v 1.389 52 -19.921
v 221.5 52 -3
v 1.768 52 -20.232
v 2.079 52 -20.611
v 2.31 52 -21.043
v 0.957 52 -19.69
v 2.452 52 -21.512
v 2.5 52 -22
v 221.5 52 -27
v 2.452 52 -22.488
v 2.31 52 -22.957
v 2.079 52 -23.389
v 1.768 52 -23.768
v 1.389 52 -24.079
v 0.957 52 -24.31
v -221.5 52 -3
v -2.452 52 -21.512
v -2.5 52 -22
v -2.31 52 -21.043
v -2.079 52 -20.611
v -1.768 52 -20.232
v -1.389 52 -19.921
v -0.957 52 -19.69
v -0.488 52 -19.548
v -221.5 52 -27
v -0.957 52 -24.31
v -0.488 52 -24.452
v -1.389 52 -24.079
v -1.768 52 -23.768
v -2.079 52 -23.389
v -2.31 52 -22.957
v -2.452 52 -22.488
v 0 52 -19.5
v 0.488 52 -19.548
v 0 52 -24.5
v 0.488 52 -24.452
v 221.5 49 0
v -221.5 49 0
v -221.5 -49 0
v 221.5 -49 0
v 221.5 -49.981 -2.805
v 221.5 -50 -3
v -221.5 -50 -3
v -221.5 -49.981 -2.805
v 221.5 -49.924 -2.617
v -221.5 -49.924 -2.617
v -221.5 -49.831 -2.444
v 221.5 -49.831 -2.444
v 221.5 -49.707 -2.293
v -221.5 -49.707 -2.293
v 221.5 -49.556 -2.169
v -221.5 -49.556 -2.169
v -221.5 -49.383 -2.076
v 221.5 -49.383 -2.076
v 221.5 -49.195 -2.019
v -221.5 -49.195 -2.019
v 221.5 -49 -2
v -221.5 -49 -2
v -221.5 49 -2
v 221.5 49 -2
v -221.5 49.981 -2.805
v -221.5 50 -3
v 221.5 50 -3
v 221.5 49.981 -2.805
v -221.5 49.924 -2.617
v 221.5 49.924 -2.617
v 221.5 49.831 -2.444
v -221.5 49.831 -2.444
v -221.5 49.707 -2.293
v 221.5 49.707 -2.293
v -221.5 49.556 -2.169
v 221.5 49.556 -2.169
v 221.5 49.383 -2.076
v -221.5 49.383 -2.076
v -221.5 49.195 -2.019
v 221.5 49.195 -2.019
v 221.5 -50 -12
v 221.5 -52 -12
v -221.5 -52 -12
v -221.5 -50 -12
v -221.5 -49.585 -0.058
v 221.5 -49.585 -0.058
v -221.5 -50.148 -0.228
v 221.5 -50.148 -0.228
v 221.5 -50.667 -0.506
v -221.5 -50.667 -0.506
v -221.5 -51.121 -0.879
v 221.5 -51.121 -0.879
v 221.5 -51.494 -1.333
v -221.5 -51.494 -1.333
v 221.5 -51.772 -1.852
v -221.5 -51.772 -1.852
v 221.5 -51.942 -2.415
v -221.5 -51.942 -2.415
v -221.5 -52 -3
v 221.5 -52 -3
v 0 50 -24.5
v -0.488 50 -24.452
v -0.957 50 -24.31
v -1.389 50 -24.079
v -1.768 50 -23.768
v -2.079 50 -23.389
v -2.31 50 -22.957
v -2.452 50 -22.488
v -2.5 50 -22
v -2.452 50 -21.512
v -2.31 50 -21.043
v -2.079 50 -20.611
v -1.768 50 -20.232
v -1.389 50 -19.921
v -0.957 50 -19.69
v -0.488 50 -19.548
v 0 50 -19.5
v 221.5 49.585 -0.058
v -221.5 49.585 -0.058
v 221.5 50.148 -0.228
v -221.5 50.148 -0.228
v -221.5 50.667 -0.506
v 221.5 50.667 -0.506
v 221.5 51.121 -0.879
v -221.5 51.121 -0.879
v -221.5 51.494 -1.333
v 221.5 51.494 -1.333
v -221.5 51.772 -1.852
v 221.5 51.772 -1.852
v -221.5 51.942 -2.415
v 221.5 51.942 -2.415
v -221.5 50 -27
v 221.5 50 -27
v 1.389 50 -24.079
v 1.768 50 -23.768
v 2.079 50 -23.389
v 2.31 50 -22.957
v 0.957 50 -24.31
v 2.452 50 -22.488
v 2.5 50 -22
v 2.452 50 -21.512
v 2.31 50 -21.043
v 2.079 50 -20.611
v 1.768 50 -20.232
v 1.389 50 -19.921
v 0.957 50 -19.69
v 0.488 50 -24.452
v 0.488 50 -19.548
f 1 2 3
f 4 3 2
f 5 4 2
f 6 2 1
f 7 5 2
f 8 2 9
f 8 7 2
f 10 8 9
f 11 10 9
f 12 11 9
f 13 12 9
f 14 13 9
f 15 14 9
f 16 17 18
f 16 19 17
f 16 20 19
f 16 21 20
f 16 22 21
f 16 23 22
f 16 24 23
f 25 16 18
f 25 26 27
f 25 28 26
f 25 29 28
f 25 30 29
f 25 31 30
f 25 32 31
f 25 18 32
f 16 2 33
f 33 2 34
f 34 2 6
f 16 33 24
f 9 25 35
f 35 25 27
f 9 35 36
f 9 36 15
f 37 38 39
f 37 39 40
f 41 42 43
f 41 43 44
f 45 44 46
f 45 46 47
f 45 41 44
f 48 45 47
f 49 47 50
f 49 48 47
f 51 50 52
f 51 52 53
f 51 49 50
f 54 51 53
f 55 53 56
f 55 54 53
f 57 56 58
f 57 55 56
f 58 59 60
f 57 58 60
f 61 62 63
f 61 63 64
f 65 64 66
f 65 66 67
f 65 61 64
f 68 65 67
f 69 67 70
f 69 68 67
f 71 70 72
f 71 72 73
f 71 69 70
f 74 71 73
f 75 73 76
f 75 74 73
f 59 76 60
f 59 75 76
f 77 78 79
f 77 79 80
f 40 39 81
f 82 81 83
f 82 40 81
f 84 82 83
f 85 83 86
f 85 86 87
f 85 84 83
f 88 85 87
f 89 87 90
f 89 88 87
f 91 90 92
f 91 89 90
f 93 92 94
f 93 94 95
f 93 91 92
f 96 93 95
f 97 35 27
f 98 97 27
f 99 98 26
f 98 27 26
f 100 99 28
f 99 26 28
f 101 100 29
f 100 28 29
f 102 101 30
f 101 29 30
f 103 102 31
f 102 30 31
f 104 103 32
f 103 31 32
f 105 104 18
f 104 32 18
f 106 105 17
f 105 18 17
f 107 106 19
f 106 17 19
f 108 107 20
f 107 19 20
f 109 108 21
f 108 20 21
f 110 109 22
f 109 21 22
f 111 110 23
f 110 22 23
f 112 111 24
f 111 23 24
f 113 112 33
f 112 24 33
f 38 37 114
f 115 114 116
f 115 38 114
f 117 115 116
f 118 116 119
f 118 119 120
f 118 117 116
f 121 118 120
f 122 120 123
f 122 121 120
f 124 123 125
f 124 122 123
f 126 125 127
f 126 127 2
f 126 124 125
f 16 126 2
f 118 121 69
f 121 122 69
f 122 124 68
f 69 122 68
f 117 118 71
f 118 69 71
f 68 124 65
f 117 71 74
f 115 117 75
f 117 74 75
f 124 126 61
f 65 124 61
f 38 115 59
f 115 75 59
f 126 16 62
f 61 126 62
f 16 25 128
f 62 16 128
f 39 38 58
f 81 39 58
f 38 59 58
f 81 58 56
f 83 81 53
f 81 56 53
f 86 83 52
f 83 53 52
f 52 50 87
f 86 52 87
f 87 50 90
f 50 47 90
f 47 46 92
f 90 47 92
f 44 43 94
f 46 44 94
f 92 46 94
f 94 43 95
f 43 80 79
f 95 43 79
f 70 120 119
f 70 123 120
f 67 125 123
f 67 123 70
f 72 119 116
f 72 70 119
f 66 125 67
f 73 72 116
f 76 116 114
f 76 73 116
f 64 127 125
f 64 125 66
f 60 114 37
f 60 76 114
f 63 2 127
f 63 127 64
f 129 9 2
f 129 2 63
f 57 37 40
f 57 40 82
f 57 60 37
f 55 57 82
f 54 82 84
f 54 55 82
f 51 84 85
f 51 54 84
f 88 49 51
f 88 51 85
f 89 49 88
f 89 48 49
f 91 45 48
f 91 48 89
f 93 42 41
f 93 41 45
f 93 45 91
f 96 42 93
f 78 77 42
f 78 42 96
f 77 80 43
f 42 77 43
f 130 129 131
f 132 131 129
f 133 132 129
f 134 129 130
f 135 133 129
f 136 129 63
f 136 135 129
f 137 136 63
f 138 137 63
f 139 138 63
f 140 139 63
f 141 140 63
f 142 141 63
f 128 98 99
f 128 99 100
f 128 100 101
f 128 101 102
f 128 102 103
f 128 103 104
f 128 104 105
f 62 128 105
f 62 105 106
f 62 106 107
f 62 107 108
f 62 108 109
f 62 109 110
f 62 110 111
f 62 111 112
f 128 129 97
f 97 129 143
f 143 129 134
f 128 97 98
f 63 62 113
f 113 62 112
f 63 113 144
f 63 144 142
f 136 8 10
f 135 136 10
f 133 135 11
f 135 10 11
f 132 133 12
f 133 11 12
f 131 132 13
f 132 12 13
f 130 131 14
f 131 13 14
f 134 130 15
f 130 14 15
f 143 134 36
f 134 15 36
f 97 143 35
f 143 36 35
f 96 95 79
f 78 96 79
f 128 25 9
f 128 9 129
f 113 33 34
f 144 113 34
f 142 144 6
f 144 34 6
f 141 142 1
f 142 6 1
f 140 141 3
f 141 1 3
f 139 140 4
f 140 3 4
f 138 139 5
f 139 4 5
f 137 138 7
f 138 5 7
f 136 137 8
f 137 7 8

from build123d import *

# Parameters (mm, degrees)
SKETCH1_W                    = 443
SKETCH1_H                    = 100
BASE_FLANGE1_DEPTH           = 2
EDGE_FLANGE1_STRIP_W         = 10
EDGE_FLANGE1_STRIP_H         = 2
EDGE_FLANGE1_STRIP_CUT_DEPTH = 443
EDGE_FLANGE1_DEPTH           = 443
EDGE_FLANGE2_STRIP_W         = 10
EDGE_FLANGE2_STRIP_H         = 2
EDGE_FLANGE2_STRIP_CUT_DEPTH = 443
EDGE_FLANGE2_DEPTH           = 443
CUT_EXTRUDE2_DEPTH           = 10


# Sheet-metal steps are written as plain solids
with BuildPart() as part:
    # Sketch1 → Base-Flange1 (new body)
    with BuildSketch(Plane.XY):
        Rectangle(SKETCH1_W, SKETCH1_H)
    extrude(amount=-BASE_FLANGE1_DEPTH)

    # Edge-Flange1 strip (across the edge) → Edge-Flange1 strip cut (cut)
    with BuildSketch(Plane(origin=(-221.5, 50, -2), x_dir=(0, -1, 0), z_dir=(1, 0, 0))):
        with Locations((-4, -1)):
            Rectangle(EDGE_FLANGE1_STRIP_W, EDGE_FLANGE1_STRIP_H)
    extrude(amount=EDGE_FLANGE1_STRIP_CUT_DEPTH, mode=Mode.SUBTRACT)

    # Edge-Flange1 section (across the edge) → Edge-Flange1 (add)
    with BuildSketch(Plane(origin=(-221.5, 50, -2), x_dir=(0, -1, 0), z_dir=(1, 0, 0))):
        with BuildLine():
            Line((-2, 1), (-2, 25))
            Line((-2, 25), (0, 25))
            Line((0, 25), (0, 1))
            ThreePointArc((0, 1), (0.292893219, 0.292893219), (1, 0))
            Line((1, 0), (1, -2))
            ThreePointArc((1, -2), (-1.121320344, -1.121320344), (-2, 1))
        make_face()
    extrude(amount=EDGE_FLANGE1_DEPTH)

    # Edge-Flange2 strip (across the edge) → Edge-Flange2 strip cut (cut)
    with BuildSketch(Plane(origin=(221.5, -50, -2), x_dir=(0, 1, 0), z_dir=(-1, 0, 0))):
        with Locations((-4, -1)):
            Rectangle(EDGE_FLANGE2_STRIP_W, EDGE_FLANGE2_STRIP_H)
    extrude(amount=EDGE_FLANGE2_STRIP_CUT_DEPTH, mode=Mode.SUBTRACT)

    # Edge-Flange2 section (across the edge) → Edge-Flange2 (add)
    with BuildSketch(Plane(origin=(221.5, -50, -2), x_dir=(0, 1, 0), z_dir=(-1, 0, 0))):
        with BuildLine():
            Line((-2, 1), (-2, 10))
            Line((-2, 10), (0, 10))
            Line((0, 10), (0, 1))
            ThreePointArc((0, 1), (0.292893219, 0.292893219), (1, 0))
            Line((1, 0), (1, -2))
            ThreePointArc((1, -2), (-1.121320344, -1.121320344), (-2, 1))
        make_face()
    extrude(amount=EDGE_FLANGE2_DEPTH)

    # Sketch13 → Cut-Extrude2 (cut)
    with BuildSketch(Plane(origin=(0, 52, 0), x_dir=(1, 0, 0), z_dir=(0, 1, 0))):
        with BuildLine():
            ThreePointArc((0, 24.5), (-2.5, 22), (0, 19.5))
            Line((0, 19.5), (0, 24.5))
        make_face()
        with BuildLine():
            Line((0, 24.5), (0, 19.5))
            ThreePointArc((0, 19.5), (1.767766953, 20.232233047), (2.5, 22))
            ThreePointArc((2.5, 22), (1.767766953, 23.767766953), (0, 24.5))
        make_face()
    extrude(amount=-CUT_EXTRUDE2_DEPTH, mode=Mode.SUBTRACT)


solid = part.part
